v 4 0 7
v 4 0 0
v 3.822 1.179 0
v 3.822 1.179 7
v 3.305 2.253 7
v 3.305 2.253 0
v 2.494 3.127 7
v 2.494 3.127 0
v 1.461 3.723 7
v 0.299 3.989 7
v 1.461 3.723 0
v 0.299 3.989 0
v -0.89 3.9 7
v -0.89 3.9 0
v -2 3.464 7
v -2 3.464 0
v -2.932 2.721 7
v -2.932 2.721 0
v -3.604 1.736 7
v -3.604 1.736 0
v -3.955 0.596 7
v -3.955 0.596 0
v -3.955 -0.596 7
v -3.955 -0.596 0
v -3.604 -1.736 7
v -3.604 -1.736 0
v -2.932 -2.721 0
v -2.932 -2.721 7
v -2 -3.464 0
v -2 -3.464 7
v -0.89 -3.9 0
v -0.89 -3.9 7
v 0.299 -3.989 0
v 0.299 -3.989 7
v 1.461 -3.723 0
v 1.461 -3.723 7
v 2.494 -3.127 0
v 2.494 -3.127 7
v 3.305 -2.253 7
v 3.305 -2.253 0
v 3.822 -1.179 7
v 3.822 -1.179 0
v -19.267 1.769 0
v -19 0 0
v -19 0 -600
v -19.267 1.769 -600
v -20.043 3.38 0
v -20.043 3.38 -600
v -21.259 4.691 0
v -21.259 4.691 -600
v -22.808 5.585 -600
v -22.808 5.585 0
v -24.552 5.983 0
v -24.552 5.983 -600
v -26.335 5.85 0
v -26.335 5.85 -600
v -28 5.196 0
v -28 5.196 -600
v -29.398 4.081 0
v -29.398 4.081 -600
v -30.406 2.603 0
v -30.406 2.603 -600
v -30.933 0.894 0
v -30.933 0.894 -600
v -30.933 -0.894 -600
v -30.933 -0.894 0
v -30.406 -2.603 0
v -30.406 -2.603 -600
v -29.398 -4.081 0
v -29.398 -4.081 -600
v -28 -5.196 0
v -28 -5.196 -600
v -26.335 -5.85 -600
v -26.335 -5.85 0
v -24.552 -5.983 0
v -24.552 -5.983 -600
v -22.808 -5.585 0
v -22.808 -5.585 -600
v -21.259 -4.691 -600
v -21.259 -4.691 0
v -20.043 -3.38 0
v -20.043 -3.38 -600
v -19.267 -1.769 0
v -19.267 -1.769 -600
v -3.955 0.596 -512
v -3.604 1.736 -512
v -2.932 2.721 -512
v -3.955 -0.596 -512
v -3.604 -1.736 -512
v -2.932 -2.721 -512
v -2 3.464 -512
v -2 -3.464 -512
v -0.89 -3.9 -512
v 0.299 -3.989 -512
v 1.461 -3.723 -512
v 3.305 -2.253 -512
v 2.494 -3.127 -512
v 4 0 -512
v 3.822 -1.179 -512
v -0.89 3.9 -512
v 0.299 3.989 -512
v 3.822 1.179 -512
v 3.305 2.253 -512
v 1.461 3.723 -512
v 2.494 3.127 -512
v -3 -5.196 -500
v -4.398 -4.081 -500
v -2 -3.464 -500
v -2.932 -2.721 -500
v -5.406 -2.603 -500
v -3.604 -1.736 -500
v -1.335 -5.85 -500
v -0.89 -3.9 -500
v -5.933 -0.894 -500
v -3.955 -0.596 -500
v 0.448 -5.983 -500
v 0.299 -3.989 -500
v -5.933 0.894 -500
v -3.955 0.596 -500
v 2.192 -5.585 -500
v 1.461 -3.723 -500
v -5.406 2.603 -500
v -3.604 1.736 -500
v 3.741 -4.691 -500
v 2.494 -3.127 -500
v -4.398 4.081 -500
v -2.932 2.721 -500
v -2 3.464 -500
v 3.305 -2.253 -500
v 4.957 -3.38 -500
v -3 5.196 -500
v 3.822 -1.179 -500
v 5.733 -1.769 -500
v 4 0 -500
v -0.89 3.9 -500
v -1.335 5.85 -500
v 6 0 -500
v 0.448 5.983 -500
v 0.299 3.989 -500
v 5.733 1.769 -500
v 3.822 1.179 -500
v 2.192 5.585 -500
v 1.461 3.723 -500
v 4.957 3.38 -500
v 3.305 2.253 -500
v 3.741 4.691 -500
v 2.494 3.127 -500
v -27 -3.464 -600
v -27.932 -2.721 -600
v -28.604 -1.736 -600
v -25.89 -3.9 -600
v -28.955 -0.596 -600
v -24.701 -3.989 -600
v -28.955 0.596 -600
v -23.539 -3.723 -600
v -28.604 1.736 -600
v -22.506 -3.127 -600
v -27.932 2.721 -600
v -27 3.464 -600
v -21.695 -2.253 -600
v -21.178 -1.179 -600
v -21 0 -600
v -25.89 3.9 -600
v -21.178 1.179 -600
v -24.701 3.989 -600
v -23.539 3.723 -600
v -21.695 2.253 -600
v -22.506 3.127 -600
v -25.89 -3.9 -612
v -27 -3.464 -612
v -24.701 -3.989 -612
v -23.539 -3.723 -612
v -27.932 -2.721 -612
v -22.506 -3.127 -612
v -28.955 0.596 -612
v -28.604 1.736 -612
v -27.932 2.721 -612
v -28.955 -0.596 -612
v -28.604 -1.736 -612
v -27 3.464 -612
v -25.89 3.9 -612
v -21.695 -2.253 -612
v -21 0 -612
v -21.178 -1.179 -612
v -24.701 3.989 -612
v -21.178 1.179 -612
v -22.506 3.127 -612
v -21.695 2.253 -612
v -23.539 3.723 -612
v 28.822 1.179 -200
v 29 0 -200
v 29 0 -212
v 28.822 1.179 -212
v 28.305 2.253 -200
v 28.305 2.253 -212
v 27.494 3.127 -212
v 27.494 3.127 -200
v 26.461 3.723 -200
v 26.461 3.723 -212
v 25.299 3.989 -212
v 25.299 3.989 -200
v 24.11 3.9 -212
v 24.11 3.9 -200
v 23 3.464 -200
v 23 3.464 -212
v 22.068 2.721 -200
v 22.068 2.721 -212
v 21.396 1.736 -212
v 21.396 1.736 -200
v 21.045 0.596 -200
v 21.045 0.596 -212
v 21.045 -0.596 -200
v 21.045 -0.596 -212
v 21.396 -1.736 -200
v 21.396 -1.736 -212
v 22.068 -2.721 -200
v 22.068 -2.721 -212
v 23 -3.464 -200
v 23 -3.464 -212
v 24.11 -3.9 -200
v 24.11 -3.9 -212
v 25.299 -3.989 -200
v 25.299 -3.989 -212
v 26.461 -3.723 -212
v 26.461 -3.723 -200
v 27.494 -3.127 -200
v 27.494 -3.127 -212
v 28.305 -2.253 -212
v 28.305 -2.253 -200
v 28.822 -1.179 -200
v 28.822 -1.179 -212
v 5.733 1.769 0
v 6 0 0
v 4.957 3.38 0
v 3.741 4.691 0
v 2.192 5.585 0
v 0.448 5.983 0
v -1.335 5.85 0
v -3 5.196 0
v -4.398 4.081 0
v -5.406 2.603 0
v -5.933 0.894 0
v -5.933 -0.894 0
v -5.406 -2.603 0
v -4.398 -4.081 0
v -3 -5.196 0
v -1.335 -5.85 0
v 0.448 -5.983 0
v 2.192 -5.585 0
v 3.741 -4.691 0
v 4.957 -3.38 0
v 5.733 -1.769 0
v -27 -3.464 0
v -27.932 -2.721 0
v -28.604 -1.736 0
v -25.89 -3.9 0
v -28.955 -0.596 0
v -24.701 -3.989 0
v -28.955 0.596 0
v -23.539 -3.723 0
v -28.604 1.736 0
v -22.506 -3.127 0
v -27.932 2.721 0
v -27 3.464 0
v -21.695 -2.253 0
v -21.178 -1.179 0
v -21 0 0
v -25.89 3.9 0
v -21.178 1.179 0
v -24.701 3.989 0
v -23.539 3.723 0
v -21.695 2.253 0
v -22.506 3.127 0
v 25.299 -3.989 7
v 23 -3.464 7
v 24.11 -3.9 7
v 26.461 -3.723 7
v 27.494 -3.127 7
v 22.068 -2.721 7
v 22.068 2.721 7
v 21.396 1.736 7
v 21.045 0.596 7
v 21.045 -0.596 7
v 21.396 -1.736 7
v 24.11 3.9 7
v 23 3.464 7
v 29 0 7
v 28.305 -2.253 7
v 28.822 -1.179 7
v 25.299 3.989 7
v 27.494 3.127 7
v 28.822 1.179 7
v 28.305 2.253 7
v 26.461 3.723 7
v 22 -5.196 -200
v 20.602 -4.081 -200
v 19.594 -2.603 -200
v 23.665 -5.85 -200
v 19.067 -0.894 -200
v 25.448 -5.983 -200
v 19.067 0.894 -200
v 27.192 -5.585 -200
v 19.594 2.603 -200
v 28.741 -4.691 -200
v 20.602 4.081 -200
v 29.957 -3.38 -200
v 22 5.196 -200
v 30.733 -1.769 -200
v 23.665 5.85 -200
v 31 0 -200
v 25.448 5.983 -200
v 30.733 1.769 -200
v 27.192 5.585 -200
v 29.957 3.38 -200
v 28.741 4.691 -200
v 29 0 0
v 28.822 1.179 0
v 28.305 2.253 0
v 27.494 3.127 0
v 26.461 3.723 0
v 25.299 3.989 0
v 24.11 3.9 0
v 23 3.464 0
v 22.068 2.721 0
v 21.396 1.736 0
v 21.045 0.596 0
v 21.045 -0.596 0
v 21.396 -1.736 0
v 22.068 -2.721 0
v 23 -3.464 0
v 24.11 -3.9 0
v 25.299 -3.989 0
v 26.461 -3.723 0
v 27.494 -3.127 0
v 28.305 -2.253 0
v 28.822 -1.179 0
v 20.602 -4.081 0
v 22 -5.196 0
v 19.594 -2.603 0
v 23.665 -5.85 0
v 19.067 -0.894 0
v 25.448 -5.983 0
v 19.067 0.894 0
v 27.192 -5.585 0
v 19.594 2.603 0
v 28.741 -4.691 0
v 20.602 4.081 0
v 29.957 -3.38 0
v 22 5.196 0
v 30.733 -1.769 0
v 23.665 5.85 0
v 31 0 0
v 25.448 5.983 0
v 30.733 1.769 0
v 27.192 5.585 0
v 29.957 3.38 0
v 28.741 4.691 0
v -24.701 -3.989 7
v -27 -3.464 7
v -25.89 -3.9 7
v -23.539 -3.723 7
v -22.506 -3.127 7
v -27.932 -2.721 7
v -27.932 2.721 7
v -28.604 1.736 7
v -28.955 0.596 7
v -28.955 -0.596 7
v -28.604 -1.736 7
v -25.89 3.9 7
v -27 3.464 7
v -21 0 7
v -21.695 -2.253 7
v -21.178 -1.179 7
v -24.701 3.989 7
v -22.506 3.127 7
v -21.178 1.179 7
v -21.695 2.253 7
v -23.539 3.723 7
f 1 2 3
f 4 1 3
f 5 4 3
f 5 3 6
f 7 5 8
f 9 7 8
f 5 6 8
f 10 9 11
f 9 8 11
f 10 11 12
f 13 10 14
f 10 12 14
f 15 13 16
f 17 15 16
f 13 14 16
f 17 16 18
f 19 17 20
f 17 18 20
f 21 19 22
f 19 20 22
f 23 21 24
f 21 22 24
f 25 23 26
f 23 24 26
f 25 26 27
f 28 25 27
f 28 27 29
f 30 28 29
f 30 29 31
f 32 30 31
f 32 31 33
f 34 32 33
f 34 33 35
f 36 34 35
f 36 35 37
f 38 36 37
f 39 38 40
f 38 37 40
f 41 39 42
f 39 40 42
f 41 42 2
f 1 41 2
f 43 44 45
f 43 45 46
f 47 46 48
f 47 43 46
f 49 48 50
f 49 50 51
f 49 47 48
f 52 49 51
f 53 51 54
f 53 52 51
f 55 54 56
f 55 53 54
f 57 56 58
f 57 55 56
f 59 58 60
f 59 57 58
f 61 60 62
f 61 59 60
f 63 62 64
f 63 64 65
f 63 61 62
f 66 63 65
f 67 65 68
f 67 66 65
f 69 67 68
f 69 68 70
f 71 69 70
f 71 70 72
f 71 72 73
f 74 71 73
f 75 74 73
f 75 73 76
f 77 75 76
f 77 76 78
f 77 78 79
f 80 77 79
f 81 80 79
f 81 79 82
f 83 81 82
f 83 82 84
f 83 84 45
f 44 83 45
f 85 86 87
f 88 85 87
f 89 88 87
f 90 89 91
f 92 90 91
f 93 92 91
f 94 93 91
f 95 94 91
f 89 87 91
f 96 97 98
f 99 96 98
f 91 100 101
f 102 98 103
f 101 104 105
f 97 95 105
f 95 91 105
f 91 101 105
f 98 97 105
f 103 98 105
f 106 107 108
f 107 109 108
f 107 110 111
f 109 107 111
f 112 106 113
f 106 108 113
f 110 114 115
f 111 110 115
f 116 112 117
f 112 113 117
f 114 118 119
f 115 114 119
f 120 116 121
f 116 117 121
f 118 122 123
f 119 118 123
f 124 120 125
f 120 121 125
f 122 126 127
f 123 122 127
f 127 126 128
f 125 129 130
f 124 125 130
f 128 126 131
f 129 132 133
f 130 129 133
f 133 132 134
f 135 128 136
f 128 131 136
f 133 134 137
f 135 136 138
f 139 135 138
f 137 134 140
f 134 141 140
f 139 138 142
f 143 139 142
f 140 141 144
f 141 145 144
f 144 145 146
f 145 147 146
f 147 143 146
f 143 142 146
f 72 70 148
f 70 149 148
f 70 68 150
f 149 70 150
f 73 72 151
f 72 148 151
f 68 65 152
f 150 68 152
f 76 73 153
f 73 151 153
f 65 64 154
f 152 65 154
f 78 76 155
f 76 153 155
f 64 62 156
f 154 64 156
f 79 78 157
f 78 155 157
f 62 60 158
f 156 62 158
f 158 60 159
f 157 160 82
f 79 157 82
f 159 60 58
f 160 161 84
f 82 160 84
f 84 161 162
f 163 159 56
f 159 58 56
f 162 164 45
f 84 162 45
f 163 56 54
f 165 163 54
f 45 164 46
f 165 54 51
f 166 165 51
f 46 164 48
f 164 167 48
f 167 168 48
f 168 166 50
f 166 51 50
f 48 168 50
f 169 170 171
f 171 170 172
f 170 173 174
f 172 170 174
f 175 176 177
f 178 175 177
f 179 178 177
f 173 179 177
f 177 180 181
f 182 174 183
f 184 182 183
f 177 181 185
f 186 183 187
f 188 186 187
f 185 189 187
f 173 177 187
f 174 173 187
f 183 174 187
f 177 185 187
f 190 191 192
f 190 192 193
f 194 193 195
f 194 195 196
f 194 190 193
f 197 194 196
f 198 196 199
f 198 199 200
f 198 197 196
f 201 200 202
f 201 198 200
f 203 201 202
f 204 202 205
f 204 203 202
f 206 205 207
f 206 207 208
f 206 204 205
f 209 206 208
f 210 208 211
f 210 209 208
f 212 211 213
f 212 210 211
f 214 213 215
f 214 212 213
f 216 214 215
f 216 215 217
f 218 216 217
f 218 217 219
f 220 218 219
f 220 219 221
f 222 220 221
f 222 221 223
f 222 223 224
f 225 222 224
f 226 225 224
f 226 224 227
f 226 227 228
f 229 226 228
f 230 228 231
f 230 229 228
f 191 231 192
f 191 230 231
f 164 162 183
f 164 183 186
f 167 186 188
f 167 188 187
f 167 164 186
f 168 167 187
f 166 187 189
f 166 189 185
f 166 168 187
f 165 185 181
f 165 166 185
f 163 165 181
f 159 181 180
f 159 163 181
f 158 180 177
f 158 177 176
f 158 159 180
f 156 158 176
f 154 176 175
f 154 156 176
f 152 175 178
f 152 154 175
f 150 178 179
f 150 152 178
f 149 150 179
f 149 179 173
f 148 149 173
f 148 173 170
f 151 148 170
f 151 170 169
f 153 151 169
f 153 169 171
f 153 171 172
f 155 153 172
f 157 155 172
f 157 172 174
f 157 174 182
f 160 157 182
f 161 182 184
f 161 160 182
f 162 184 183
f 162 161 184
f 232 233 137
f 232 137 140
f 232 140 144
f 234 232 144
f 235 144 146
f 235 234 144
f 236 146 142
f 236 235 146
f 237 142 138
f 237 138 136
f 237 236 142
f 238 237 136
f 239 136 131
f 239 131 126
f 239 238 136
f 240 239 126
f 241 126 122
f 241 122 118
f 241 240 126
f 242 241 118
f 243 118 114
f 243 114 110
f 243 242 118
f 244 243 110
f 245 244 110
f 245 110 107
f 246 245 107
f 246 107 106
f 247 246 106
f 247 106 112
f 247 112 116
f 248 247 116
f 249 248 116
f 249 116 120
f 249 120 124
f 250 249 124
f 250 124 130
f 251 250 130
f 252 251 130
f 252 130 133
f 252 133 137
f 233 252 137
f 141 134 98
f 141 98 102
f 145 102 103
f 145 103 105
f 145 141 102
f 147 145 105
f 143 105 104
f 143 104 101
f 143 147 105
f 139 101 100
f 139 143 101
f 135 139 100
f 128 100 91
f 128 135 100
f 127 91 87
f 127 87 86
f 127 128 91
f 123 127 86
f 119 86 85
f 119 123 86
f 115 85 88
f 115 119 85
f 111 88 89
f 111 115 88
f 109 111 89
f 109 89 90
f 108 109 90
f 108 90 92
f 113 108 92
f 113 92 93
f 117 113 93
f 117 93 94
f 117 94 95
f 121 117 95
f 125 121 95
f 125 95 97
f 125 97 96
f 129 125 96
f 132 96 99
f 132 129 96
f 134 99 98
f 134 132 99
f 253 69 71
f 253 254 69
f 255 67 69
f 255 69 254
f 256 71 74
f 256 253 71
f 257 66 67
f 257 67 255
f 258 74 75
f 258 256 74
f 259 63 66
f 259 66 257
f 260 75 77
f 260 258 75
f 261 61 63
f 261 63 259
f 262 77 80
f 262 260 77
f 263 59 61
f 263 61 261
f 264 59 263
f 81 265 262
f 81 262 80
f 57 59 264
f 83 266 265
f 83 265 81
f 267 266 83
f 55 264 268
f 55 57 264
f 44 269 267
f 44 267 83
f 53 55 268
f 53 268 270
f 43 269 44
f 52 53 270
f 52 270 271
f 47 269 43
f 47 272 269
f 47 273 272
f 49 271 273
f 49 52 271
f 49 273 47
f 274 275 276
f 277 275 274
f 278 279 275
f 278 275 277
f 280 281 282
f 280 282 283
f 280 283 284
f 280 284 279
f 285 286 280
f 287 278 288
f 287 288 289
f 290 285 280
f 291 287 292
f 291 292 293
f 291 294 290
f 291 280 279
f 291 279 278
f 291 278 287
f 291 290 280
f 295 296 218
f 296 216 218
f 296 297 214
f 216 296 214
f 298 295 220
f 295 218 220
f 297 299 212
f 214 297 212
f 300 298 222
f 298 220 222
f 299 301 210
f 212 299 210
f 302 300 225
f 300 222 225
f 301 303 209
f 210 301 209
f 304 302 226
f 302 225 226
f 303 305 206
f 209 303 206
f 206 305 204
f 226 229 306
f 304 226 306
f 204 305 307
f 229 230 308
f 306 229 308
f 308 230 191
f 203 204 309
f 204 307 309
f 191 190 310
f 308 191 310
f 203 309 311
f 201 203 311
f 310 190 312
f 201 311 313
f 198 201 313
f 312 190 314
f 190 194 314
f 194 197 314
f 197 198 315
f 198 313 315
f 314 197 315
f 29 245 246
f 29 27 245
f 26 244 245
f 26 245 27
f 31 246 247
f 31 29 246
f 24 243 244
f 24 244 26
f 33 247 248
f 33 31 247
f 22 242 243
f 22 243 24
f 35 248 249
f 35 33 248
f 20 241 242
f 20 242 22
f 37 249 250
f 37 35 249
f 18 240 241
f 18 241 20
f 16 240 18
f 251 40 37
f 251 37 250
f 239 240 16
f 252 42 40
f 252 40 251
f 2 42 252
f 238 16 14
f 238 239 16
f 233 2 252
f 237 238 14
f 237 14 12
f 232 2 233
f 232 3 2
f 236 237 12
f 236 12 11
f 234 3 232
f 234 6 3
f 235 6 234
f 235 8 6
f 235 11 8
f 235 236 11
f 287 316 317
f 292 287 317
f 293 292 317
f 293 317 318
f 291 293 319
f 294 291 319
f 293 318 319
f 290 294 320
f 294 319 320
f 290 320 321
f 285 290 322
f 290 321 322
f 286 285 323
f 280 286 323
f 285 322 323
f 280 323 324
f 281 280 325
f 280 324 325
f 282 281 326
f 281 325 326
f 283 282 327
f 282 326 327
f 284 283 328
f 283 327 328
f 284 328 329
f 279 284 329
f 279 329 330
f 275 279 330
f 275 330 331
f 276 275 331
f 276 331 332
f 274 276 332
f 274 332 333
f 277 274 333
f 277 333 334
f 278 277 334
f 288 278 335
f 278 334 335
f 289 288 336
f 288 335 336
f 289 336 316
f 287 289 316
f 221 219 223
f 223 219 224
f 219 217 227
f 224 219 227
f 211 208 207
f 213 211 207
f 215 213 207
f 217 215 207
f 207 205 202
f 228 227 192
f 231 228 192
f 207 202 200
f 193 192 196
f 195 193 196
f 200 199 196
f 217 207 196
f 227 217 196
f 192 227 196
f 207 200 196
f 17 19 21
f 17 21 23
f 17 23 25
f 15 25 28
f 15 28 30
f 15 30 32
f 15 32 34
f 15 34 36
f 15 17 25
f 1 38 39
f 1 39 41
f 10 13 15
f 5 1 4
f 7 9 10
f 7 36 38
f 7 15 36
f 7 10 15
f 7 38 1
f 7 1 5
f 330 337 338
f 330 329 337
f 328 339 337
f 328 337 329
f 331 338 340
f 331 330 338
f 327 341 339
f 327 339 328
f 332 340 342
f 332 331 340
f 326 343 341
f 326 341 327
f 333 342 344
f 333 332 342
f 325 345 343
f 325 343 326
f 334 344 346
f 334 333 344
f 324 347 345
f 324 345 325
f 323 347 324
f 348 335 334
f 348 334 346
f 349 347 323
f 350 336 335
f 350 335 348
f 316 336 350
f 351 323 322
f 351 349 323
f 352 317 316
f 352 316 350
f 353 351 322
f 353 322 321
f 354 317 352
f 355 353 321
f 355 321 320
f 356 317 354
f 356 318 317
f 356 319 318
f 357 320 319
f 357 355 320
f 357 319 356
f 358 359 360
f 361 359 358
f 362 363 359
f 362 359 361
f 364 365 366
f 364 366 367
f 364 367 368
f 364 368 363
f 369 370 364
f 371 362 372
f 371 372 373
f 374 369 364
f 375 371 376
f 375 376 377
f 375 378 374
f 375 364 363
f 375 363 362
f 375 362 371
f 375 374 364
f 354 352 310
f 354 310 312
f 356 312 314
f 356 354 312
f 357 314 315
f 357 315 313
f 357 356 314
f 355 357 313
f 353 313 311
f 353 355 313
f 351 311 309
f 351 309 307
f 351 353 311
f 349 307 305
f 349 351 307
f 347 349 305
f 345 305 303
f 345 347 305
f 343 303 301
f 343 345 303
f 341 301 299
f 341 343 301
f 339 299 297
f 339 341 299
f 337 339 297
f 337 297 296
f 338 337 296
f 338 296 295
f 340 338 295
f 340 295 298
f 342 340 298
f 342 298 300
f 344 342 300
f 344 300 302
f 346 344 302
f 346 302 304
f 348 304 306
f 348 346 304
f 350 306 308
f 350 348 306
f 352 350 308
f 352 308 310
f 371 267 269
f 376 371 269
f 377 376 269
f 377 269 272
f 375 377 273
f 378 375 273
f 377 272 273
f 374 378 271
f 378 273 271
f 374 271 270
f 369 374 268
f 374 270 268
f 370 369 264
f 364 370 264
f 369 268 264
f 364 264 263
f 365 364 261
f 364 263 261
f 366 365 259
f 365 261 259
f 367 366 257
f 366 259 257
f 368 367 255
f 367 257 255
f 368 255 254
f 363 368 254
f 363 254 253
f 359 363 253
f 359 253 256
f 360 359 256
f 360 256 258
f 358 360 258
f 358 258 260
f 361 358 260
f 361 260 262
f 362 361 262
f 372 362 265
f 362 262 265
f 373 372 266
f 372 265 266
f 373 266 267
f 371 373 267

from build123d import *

# Parameters (mm, degrees)
F5_R      = 6
F5_R_2    = 4
F6_DEPTH  = 600
F7_DEPTH  = 500
F8_DEPTH  = 200
F9_DEPTH  = 7
F10_START = -200
F10_DEPTH = 12
F11_START = -500
F11_DEPTH = 12
F12_START = -600
F12_DEPTH = 12


with BuildPart() as f6:
    # F5 (on Top) → F6 (new body)
    with BuildSketch(Plane.XY):
        with Locations((-25, 0)):
            Circle(F5_R)
        with Locations((-25, 0)):
            Circle(F5_R_2, mode=Mode.SUBTRACT)
        with Locations((-25, 0)):
            Circle(F5_R_2)
    extrude(amount=-F6_DEPTH)

    # F5 (on Top) → F9 (join)
    with BuildSketch(Plane.XY):
        with Locations((-25, 0)):
            Circle(F5_R_2)
    extrude(amount=F9_DEPTH)

    # F5 (on Top) → F10, piece 3 (join)
    with BuildSketch(Plane.XY.offset(F10_START)):
        with Locations((-25, 0)):
            Circle(F5_R)
        with Locations((-25, 0)):
            Circle(F5_R_2, mode=Mode.SUBTRACT)
    extrude(amount=-F10_DEPTH)

    # F5 (on Top) → F12 (join)
    with BuildSketch(Plane.XY.offset(F12_START)):
        with Locations((-25, 0)):
            Circle(F5_R_2)
    extrude(amount=-F12_DEPTH)


with BuildPart() as f7:
    # F5 (on Top) → F7 (new body)
    with BuildSketch(Plane.XY):
        Circle(F5_R)
        Circle(F5_R_2, mode=Mode.SUBTRACT)
        Circle(F5_R_2)
    extrude(amount=-F7_DEPTH)

    # F5 (on Top) → F9, piece 2 (join)
    with BuildSketch(Plane.XY):
        Circle(F5_R_2)
    extrude(amount=F9_DEPTH)

    # F5 (on Top) → F10, piece 2 (join)
    with BuildSketch(Plane.XY.offset(F10_START)):
        Circle(F5_R)
        Circle(F5_R_2, mode=Mode.SUBTRACT)
    extrude(amount=-F10_DEPTH)

    # F5 (on Top) → F11 (join)
    with BuildSketch(Plane.XY.offset(F11_START)):
        Circle(F5_R_2)
    extrude(amount=-F11_DEPTH)


with BuildPart() as f8:
    # F5 (on Top) → F8 (new body)
    with BuildSketch(Plane.XY):
        with Locations((25, 0)):
            Circle(F5_R)
        with Locations((25, 0)):
            Circle(F5_R_2, mode=Mode.SUBTRACT)
        with Locations((25, 0)):
            Circle(F5_R_2)
    extrude(amount=-F8_DEPTH)

    # F5 (on Top) → F9, piece 3 (join)
    with BuildSketch(Plane.XY):
        with Locations((25, 0)):
            Circle(F5_R_2)
    extrude(amount=F9_DEPTH)

    # F5 (on Top) → F10 (join)
    with BuildSketch(Plane.XY.offset(F10_START)):
        with Locations((25, 0)):
            Circle(F5_R_2)
    extrude(amount=-F10_DEPTH)


solid = Compound([f6.part, f7.part, f8.part])
